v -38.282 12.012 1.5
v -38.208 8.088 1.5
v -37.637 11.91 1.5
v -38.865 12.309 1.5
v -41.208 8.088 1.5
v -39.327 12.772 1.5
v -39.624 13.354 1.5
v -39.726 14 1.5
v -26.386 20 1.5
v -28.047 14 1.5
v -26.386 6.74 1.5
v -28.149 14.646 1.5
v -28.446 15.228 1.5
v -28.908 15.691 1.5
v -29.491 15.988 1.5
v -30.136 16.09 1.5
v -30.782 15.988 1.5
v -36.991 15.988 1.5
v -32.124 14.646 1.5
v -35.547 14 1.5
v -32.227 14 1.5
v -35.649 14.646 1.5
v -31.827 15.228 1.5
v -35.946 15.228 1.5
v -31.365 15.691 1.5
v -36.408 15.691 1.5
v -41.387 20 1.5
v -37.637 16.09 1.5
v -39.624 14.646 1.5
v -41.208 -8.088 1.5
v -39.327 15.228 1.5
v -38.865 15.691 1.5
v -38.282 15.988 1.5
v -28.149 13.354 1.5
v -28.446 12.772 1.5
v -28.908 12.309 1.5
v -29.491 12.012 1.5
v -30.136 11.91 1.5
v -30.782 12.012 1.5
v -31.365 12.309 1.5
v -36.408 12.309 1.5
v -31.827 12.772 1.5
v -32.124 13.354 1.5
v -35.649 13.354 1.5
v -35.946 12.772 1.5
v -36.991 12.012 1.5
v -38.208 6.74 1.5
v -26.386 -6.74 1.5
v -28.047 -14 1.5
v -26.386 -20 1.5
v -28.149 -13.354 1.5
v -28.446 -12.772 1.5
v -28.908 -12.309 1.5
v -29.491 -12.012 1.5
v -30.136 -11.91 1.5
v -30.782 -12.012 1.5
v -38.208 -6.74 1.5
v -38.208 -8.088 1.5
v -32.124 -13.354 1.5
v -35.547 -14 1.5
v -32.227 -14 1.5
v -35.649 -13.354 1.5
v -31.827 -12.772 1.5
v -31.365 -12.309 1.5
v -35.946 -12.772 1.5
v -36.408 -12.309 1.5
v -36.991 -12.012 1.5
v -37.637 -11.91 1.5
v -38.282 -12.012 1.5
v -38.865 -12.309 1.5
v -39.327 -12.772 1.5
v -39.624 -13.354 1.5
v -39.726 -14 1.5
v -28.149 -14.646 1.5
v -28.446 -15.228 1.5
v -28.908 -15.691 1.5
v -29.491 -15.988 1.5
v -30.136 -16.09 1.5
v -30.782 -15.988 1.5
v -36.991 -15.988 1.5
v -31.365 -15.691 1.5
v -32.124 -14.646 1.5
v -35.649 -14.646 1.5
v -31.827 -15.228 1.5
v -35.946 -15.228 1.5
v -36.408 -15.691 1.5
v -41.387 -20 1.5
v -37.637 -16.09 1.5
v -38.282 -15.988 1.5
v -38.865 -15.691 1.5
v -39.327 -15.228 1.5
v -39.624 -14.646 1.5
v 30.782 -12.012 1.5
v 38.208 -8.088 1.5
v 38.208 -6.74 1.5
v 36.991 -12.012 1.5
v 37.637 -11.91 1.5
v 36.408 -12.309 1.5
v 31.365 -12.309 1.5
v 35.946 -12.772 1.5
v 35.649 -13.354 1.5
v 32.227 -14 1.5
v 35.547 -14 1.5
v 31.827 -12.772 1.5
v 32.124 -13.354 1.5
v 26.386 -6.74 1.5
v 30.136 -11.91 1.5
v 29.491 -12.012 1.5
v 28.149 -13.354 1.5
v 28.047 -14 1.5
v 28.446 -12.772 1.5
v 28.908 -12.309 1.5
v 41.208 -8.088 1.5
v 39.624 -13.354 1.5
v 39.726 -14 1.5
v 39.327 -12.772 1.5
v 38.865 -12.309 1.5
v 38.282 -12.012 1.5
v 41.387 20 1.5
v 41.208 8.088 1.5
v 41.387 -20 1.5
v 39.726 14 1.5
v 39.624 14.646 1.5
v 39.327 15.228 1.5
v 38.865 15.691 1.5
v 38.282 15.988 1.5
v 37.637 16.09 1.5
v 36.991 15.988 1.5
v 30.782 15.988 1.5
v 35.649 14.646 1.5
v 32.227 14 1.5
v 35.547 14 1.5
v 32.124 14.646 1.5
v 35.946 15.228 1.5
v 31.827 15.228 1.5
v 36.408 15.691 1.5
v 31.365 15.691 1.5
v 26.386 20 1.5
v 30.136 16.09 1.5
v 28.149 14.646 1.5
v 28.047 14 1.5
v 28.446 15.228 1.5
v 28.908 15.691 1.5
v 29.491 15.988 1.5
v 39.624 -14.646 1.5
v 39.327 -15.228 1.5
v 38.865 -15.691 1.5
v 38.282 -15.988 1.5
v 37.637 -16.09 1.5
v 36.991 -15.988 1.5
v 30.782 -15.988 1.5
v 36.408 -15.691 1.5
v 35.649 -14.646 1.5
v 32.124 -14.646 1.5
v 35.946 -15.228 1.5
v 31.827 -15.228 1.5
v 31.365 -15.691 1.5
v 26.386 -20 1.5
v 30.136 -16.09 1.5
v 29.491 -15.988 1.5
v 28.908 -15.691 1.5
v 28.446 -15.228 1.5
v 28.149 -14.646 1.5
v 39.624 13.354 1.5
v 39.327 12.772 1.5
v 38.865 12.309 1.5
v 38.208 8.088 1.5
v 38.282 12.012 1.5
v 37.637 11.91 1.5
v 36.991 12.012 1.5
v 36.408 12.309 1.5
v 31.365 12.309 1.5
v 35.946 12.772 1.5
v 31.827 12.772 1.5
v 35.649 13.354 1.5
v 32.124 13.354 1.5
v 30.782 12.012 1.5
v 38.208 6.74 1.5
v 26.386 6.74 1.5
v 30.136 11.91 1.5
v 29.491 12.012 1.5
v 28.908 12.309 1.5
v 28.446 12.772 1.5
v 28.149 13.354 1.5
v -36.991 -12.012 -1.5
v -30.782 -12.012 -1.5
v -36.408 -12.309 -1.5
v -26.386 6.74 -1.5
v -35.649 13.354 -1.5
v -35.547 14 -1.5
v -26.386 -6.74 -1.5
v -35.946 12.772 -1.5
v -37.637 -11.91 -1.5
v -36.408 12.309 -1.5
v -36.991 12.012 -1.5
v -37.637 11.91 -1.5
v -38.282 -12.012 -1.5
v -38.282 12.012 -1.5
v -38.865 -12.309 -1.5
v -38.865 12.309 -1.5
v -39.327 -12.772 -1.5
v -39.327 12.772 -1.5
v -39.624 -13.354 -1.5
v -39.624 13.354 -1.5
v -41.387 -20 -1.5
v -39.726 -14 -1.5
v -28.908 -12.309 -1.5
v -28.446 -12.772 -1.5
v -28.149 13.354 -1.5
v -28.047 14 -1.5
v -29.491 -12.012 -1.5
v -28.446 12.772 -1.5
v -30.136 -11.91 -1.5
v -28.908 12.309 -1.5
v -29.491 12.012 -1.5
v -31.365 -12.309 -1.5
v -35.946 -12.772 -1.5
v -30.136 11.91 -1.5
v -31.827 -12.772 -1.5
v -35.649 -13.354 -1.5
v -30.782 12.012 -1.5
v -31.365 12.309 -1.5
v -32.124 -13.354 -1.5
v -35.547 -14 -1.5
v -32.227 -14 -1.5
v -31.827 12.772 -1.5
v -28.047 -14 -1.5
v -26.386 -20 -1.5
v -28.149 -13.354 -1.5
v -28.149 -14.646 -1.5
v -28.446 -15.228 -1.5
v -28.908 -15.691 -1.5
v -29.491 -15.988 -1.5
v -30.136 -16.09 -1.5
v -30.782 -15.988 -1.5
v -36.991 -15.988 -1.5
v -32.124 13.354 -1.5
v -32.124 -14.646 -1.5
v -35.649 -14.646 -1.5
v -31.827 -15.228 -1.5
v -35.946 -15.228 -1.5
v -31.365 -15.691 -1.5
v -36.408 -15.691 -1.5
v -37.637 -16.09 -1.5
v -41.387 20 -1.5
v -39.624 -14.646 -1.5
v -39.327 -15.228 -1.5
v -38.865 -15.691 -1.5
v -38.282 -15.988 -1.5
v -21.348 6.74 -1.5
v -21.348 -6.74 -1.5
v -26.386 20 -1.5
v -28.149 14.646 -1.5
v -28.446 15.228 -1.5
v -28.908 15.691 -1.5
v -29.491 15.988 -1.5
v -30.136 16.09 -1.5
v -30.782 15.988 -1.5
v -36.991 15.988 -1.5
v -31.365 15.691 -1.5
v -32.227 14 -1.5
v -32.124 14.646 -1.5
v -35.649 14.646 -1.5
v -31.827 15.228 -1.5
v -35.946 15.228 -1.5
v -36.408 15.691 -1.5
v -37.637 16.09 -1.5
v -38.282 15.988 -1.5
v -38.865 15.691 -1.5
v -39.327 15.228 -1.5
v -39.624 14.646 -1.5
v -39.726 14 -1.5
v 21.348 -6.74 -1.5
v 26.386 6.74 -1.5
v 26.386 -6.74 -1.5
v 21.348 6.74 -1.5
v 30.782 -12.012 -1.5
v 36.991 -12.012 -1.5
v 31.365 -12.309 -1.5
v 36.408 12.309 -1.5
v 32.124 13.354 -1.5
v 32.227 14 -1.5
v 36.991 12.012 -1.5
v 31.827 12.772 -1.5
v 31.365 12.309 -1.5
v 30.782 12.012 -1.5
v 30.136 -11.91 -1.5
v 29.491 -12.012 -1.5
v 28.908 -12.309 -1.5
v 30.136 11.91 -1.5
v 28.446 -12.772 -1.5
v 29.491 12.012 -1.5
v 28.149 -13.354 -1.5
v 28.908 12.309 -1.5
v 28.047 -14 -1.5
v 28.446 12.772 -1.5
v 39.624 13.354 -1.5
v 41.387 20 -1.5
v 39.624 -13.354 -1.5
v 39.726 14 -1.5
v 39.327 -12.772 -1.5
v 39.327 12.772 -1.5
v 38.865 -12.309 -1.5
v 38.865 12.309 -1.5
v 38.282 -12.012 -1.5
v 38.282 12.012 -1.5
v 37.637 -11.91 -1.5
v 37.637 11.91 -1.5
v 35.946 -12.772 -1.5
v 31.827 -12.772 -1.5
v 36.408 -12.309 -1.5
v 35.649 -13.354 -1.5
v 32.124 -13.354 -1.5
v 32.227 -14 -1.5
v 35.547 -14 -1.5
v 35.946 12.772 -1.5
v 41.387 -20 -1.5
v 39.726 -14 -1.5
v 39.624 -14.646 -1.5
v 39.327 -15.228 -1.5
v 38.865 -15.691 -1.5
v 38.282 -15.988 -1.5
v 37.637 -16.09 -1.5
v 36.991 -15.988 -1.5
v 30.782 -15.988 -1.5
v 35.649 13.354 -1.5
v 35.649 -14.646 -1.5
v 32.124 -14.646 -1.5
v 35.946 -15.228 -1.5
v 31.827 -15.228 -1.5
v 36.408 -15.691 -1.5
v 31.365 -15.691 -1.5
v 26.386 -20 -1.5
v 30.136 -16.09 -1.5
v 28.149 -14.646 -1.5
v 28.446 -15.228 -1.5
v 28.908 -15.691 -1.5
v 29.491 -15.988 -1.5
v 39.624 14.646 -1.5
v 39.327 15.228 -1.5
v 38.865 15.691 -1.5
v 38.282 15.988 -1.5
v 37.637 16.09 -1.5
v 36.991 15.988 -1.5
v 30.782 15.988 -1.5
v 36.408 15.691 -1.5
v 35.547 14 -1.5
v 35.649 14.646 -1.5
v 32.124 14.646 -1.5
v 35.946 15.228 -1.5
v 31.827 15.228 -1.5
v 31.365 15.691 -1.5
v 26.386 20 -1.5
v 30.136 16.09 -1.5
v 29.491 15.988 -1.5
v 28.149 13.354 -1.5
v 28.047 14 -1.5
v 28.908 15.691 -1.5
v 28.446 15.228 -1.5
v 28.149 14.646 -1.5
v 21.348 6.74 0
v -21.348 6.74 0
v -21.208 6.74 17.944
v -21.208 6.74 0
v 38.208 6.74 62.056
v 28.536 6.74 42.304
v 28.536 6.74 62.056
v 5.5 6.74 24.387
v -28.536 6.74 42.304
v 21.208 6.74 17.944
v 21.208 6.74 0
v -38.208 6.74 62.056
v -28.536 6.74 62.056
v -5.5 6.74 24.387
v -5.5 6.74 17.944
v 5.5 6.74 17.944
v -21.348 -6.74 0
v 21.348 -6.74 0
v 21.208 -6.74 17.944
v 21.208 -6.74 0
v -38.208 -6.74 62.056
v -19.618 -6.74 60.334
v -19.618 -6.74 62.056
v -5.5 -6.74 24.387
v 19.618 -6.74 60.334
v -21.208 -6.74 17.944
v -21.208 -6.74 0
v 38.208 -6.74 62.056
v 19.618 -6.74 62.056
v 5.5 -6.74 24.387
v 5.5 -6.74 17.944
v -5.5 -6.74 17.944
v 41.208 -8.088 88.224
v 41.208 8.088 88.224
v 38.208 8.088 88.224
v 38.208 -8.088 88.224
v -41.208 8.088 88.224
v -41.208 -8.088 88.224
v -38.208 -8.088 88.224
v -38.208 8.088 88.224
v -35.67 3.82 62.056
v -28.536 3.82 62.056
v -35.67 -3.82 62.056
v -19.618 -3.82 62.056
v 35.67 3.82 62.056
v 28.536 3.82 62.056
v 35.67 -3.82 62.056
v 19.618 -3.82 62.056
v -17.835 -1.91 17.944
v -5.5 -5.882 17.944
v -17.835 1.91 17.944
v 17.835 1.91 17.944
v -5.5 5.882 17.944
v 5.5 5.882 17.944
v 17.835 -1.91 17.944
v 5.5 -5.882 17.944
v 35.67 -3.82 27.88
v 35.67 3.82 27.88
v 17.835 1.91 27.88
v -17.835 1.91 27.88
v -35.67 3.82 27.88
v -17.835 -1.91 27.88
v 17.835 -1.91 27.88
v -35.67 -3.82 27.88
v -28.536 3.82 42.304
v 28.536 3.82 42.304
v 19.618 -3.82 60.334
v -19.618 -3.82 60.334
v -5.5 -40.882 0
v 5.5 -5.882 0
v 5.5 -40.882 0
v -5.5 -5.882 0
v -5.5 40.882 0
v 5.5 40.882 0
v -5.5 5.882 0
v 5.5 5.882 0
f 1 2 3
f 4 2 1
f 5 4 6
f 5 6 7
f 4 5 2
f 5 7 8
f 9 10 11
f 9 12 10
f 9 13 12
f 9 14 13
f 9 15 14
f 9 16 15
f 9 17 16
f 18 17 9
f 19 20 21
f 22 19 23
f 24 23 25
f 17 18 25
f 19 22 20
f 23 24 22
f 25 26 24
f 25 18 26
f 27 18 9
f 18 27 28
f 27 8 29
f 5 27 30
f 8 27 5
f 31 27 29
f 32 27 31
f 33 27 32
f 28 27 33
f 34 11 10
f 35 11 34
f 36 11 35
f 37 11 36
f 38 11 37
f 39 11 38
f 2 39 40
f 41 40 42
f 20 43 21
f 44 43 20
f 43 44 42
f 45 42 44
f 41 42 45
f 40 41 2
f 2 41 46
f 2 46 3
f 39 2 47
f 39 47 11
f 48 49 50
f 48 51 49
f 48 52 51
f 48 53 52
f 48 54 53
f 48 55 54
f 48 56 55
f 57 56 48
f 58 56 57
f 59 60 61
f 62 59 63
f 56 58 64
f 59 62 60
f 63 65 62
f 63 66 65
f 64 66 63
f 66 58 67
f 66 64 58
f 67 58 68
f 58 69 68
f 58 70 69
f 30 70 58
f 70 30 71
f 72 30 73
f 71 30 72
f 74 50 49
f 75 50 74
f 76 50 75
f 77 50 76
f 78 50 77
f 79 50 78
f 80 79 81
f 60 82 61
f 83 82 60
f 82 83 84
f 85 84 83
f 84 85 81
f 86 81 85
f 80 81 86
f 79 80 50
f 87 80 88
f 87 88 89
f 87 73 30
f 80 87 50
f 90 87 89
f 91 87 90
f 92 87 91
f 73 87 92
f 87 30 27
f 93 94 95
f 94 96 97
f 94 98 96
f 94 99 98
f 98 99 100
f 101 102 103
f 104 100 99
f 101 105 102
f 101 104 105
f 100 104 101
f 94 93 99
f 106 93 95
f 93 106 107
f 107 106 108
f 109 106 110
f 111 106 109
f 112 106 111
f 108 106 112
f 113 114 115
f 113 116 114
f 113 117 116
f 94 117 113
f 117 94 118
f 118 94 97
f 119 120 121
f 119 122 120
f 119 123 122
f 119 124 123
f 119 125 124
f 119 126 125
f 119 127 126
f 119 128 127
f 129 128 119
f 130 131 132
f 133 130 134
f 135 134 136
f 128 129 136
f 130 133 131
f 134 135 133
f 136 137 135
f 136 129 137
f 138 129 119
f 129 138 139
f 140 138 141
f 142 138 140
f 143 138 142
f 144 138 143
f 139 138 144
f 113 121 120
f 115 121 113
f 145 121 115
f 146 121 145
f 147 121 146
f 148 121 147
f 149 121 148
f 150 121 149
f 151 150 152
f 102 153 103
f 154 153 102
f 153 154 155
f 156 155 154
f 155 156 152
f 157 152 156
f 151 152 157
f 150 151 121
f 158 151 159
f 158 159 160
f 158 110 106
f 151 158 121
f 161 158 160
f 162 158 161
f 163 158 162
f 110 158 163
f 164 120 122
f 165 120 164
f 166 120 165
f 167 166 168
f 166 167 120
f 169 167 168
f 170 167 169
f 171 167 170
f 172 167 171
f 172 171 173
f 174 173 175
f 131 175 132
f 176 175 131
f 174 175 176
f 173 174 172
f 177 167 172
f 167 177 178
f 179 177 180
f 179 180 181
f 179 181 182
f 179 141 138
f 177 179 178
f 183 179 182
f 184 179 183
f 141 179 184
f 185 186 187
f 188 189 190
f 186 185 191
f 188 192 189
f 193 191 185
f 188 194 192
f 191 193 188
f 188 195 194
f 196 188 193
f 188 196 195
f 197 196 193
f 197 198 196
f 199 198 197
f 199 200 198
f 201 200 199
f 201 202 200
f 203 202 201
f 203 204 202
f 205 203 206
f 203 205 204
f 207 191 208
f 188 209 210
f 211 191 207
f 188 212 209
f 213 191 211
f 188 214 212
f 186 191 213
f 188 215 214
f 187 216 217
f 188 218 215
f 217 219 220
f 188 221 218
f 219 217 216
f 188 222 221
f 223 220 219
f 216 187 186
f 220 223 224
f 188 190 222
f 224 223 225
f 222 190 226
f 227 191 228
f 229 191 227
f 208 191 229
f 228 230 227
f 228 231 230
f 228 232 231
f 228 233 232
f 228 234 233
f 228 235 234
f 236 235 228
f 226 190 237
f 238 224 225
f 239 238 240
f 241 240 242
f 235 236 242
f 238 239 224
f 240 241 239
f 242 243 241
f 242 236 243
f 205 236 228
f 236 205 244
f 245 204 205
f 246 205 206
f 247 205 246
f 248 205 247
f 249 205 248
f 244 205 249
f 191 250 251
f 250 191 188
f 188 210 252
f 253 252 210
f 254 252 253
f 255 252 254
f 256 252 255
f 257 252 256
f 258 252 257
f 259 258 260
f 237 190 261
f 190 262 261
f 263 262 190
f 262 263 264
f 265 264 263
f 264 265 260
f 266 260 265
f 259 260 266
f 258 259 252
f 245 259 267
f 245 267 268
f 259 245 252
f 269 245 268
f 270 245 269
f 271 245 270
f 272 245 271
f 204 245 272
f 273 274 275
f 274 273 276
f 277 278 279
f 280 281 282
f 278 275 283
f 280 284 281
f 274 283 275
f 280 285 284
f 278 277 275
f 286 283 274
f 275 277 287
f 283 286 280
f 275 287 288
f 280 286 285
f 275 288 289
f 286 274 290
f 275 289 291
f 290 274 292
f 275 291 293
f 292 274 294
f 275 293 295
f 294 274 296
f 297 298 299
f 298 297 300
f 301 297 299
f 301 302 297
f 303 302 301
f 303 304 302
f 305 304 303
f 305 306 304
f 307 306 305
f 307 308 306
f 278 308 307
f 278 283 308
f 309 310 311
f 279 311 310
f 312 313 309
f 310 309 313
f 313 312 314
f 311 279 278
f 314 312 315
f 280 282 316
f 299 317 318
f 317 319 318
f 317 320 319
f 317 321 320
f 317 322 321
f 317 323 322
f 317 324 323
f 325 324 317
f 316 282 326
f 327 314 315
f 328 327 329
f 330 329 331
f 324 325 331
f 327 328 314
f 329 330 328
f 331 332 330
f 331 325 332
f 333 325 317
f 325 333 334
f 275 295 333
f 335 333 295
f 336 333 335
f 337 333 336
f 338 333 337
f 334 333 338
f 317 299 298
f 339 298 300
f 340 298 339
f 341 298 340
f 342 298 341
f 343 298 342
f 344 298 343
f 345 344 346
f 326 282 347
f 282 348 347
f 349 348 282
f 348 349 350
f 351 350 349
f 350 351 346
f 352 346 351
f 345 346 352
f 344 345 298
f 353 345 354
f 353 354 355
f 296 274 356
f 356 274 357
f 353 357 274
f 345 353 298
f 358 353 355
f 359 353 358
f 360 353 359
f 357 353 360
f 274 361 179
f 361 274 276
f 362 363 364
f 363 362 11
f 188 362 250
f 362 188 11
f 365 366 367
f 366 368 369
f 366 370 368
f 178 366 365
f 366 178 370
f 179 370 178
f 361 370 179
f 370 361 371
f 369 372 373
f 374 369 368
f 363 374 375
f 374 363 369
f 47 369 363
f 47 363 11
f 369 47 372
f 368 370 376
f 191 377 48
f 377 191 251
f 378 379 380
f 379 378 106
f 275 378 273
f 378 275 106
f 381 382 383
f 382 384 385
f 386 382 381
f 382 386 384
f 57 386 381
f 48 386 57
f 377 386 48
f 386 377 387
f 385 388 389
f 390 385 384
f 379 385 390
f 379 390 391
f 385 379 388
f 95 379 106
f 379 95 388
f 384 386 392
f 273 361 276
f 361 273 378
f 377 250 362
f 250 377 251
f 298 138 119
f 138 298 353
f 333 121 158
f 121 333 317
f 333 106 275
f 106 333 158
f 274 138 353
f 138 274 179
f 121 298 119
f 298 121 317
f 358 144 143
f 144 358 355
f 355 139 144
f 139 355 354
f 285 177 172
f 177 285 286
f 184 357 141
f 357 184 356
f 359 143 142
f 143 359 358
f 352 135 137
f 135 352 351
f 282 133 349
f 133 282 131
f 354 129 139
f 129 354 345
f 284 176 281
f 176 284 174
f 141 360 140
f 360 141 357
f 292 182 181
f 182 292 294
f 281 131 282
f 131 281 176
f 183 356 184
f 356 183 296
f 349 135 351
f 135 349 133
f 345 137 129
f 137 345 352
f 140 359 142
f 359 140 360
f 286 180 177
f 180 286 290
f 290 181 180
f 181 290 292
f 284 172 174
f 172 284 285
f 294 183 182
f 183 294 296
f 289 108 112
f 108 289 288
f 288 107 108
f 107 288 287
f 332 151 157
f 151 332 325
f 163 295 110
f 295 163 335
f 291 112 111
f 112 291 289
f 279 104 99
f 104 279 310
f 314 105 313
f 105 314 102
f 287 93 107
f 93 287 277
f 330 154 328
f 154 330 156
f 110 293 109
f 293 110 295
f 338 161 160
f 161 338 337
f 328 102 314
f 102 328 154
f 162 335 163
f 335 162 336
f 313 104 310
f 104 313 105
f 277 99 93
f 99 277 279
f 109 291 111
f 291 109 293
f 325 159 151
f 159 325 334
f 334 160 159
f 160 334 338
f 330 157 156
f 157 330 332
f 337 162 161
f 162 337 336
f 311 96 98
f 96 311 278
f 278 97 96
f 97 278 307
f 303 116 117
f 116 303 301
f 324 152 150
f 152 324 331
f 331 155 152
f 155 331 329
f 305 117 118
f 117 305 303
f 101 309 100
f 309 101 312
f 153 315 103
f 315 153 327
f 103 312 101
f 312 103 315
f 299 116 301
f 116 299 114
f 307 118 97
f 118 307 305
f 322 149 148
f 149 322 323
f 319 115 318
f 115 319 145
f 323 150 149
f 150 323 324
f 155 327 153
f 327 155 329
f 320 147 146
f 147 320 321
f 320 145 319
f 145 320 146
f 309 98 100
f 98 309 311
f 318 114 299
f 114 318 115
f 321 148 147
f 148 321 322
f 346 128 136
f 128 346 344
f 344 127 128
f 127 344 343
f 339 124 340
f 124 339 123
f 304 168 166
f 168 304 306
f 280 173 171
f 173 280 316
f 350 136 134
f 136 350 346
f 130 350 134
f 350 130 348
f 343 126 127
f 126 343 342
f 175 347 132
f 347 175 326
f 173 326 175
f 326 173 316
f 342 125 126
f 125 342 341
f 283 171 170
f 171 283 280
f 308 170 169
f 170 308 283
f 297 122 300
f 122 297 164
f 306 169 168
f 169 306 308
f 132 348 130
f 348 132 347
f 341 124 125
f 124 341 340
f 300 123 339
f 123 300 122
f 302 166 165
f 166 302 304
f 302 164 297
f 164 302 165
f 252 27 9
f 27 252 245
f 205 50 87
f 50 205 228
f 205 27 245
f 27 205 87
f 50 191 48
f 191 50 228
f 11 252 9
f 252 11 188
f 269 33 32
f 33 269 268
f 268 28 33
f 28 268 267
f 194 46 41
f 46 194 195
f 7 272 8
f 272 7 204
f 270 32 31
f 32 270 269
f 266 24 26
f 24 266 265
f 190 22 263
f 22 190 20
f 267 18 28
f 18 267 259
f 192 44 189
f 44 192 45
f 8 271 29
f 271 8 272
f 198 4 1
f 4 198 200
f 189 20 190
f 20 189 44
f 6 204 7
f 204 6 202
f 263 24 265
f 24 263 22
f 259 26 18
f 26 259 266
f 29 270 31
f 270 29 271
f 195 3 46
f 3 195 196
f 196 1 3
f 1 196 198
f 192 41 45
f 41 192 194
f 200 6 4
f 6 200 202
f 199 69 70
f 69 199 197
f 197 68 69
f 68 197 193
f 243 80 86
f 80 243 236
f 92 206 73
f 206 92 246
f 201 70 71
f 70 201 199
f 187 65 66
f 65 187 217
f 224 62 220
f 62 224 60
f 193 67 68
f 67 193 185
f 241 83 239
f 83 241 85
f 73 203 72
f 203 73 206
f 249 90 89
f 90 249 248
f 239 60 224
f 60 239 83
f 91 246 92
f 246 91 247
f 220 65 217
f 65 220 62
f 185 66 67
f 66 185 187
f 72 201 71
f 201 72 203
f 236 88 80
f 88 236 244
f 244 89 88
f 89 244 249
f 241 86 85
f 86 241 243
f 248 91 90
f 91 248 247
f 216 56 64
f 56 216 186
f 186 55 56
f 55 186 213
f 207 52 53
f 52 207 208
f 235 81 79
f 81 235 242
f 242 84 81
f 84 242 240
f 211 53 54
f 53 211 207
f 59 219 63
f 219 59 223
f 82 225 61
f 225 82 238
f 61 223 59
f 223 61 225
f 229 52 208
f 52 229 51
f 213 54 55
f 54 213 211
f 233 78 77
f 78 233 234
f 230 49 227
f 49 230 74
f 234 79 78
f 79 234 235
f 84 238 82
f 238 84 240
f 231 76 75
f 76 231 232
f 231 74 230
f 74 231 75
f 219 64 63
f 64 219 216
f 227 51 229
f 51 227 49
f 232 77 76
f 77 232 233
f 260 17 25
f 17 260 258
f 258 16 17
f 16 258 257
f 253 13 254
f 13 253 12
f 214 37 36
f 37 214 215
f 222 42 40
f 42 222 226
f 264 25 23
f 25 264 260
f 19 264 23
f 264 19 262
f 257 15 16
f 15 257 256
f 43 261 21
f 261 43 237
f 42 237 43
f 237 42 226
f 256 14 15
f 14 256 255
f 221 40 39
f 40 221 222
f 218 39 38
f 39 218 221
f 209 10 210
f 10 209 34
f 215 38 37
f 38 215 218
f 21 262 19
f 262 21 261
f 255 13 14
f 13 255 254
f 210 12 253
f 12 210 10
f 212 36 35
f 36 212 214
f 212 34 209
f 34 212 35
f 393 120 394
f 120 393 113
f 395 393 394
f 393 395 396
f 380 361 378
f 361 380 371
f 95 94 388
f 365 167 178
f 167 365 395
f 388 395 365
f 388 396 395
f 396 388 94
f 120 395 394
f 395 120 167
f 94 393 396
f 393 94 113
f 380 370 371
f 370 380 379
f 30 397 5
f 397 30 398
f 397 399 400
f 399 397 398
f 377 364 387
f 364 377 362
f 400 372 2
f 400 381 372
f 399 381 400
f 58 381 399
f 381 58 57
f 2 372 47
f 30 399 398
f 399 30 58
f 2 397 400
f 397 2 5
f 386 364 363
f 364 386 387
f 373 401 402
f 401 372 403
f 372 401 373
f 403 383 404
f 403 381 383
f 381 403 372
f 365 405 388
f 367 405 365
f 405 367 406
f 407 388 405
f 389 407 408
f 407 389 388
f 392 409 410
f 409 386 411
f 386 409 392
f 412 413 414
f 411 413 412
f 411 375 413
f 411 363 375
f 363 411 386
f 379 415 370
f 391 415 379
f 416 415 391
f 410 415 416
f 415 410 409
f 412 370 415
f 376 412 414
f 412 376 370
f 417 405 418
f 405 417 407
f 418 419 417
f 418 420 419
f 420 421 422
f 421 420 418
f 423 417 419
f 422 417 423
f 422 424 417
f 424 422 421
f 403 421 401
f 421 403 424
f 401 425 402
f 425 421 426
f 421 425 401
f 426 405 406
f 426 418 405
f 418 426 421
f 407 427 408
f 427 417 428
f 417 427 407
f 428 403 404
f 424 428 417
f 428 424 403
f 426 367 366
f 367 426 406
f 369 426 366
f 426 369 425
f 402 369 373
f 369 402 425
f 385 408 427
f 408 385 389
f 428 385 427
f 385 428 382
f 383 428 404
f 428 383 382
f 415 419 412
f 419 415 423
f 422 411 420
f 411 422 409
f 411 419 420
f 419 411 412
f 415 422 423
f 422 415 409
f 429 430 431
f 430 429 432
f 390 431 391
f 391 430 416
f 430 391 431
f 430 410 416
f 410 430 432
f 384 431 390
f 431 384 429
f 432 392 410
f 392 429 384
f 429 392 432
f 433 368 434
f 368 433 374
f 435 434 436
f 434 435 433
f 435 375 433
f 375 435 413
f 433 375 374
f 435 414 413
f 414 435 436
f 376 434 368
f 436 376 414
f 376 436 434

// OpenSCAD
// file: ScrewMount.scad
include <MakerBotSettings.scad>
// Screw Mounts
width = 40;
height = 15;
res=20; // Cylinder resolution
screw_offset_x = .35 * width;
screw_offset_y = .25 * height;
screw_radius = 1.25 + global_correction;
screw_height = 3;
module ScrewMount(x,y,z) {
	translate( [x,y,z] )
		rotate( 90 ) // Rotate for placement
		// Subtract screw holes from base
		difference()  {
			// Draw base
			cube( [width,height,3], center = true );
			// Draw screw holes
			Screw(screw_offset_x, screw_offset_y, 0);
			Screw(-1 * screw_offset_x, screw_offset_y, 0);
			Screw(-1 * screw_offset_x, -1 * screw_offset_y, 0);
			Screw(screw_offset_x, -1 * screw_offset_y, 0);
		}
}
module Screw(x,y,z) {
	translate( [x,y,z] )
		cylinder( screw_height, screw_radius, screw_radius, $fn=res, center = true );
}
ScrewMount(0,0,0);
// file: MakerBotSettings.scad
// Printer settings
extruder_width = 0.4;
global_correction = 0.04 + 2*extruder_width;
// main file
/**
 * Filename: PhoneMount.scad
 * Description: Bracket designed to mount a Samsung Galaxy S6 onto a tiny
 *              mobile robot
 */
include <MakerBotSettings.scad>
use <ScrewMount.scad>;




// Dimensions
phone_width = 70.5   + global_correction;
phone_depth = 6.8    + global_correction;
phone_height = 143.4 + global_correction;

casing_wiggle = 5 + global_correction;
casing_depth = phone_depth + casing_wiggle; 
casing_width = phone_width + casing_wiggle + global_correction; 
casing_height = phone_height * .3 + global_correction;

screw_mount_placement =  ( .95 * phone_width ) / 2;

FullStand();

// Uncomment the below line to get the 2d projection
//projection( cut=true)
module FullStand() {
	union() {
		// Draw primary stand
		//rotate(90) 
		//BaseStation();
		BaseStation();

		// Draw triangular supports
		Support();
		rotate(180)
			Support();

		// Draw vertical supports
		translate( [.8*casing_width/2,0,0] ) 
			HorizontalSupport();
		translate( [-.8*casing_width/2,0,0] )
			rotate(180)
			HorizontalSupport();

		// Draw the phone case itself
		translate( [0,0, 40 ] ) {  
			DrawCase();  
		}
	}
}

//translate( [0,0,80] )
//DrawPhone();

// Tringular Support
module Support( l=11,w=35,h=25) {
	translate( [ 0,  -.69 * screw_mount_placement, 0 ] )
		prism(l,w,h);
}

module VerticalSupport( height=1 ) {
	width = casing_depth * 1.2;
	translate( [7,width/-2,0] )
		cube( [3,width,height]);
}

module HorizontalSupport(height=10) {
	VerticalSupport(casing_height*2);
	translate([0,0,height])
		cube([20,casing_depth ,height*2], center=true);
}

module BaseStation() {
	union () {
		difference() {
		cube( [screw_mount_placement * 2, casing_depth, 3] , center=true);
		scale([.63,1,1])
		cube( [screw_mount_placement * 2, casing_depth, 3] , center=true);
		}
		ScrewMount( screw_mount_placement,0,0);
		ScrewMount( -1 * screw_mount_placement,0,0);
	}
}


module DrawPhone( v = [0,0,0], s=1) {
	translate(v)
		cube( [s*phone_width , s*phone_depth, s*phone_height ], center = true );
}

module DrawCase() {
	y_off = 60;
	difference() {
		rotate(90)
			cube( [ casing_depth, casing_width, casing_height  ], center = true );
		DrawPhone([0,0,y_off]);
		DrawPhone([0,5,y_off], s=.8);
		DrawPhone([0,-5,y_off], s=.55);
		DrawPhone([0,0,-30], s=.5);

	}

}





module prism(l, w, h){
	translate([ -1 * l/2, -1 *  w/2,0])
		polyhedron(
				points=[[0,0,0], [l,0,0], [l,w,0], [0,w,0], [0,w,h], [l,w,h]],
				faces=[[0,1,2,3],[5,4,3,2],[0,4,5,1],[0,3,4],[5,2,1]]
			  );


}
